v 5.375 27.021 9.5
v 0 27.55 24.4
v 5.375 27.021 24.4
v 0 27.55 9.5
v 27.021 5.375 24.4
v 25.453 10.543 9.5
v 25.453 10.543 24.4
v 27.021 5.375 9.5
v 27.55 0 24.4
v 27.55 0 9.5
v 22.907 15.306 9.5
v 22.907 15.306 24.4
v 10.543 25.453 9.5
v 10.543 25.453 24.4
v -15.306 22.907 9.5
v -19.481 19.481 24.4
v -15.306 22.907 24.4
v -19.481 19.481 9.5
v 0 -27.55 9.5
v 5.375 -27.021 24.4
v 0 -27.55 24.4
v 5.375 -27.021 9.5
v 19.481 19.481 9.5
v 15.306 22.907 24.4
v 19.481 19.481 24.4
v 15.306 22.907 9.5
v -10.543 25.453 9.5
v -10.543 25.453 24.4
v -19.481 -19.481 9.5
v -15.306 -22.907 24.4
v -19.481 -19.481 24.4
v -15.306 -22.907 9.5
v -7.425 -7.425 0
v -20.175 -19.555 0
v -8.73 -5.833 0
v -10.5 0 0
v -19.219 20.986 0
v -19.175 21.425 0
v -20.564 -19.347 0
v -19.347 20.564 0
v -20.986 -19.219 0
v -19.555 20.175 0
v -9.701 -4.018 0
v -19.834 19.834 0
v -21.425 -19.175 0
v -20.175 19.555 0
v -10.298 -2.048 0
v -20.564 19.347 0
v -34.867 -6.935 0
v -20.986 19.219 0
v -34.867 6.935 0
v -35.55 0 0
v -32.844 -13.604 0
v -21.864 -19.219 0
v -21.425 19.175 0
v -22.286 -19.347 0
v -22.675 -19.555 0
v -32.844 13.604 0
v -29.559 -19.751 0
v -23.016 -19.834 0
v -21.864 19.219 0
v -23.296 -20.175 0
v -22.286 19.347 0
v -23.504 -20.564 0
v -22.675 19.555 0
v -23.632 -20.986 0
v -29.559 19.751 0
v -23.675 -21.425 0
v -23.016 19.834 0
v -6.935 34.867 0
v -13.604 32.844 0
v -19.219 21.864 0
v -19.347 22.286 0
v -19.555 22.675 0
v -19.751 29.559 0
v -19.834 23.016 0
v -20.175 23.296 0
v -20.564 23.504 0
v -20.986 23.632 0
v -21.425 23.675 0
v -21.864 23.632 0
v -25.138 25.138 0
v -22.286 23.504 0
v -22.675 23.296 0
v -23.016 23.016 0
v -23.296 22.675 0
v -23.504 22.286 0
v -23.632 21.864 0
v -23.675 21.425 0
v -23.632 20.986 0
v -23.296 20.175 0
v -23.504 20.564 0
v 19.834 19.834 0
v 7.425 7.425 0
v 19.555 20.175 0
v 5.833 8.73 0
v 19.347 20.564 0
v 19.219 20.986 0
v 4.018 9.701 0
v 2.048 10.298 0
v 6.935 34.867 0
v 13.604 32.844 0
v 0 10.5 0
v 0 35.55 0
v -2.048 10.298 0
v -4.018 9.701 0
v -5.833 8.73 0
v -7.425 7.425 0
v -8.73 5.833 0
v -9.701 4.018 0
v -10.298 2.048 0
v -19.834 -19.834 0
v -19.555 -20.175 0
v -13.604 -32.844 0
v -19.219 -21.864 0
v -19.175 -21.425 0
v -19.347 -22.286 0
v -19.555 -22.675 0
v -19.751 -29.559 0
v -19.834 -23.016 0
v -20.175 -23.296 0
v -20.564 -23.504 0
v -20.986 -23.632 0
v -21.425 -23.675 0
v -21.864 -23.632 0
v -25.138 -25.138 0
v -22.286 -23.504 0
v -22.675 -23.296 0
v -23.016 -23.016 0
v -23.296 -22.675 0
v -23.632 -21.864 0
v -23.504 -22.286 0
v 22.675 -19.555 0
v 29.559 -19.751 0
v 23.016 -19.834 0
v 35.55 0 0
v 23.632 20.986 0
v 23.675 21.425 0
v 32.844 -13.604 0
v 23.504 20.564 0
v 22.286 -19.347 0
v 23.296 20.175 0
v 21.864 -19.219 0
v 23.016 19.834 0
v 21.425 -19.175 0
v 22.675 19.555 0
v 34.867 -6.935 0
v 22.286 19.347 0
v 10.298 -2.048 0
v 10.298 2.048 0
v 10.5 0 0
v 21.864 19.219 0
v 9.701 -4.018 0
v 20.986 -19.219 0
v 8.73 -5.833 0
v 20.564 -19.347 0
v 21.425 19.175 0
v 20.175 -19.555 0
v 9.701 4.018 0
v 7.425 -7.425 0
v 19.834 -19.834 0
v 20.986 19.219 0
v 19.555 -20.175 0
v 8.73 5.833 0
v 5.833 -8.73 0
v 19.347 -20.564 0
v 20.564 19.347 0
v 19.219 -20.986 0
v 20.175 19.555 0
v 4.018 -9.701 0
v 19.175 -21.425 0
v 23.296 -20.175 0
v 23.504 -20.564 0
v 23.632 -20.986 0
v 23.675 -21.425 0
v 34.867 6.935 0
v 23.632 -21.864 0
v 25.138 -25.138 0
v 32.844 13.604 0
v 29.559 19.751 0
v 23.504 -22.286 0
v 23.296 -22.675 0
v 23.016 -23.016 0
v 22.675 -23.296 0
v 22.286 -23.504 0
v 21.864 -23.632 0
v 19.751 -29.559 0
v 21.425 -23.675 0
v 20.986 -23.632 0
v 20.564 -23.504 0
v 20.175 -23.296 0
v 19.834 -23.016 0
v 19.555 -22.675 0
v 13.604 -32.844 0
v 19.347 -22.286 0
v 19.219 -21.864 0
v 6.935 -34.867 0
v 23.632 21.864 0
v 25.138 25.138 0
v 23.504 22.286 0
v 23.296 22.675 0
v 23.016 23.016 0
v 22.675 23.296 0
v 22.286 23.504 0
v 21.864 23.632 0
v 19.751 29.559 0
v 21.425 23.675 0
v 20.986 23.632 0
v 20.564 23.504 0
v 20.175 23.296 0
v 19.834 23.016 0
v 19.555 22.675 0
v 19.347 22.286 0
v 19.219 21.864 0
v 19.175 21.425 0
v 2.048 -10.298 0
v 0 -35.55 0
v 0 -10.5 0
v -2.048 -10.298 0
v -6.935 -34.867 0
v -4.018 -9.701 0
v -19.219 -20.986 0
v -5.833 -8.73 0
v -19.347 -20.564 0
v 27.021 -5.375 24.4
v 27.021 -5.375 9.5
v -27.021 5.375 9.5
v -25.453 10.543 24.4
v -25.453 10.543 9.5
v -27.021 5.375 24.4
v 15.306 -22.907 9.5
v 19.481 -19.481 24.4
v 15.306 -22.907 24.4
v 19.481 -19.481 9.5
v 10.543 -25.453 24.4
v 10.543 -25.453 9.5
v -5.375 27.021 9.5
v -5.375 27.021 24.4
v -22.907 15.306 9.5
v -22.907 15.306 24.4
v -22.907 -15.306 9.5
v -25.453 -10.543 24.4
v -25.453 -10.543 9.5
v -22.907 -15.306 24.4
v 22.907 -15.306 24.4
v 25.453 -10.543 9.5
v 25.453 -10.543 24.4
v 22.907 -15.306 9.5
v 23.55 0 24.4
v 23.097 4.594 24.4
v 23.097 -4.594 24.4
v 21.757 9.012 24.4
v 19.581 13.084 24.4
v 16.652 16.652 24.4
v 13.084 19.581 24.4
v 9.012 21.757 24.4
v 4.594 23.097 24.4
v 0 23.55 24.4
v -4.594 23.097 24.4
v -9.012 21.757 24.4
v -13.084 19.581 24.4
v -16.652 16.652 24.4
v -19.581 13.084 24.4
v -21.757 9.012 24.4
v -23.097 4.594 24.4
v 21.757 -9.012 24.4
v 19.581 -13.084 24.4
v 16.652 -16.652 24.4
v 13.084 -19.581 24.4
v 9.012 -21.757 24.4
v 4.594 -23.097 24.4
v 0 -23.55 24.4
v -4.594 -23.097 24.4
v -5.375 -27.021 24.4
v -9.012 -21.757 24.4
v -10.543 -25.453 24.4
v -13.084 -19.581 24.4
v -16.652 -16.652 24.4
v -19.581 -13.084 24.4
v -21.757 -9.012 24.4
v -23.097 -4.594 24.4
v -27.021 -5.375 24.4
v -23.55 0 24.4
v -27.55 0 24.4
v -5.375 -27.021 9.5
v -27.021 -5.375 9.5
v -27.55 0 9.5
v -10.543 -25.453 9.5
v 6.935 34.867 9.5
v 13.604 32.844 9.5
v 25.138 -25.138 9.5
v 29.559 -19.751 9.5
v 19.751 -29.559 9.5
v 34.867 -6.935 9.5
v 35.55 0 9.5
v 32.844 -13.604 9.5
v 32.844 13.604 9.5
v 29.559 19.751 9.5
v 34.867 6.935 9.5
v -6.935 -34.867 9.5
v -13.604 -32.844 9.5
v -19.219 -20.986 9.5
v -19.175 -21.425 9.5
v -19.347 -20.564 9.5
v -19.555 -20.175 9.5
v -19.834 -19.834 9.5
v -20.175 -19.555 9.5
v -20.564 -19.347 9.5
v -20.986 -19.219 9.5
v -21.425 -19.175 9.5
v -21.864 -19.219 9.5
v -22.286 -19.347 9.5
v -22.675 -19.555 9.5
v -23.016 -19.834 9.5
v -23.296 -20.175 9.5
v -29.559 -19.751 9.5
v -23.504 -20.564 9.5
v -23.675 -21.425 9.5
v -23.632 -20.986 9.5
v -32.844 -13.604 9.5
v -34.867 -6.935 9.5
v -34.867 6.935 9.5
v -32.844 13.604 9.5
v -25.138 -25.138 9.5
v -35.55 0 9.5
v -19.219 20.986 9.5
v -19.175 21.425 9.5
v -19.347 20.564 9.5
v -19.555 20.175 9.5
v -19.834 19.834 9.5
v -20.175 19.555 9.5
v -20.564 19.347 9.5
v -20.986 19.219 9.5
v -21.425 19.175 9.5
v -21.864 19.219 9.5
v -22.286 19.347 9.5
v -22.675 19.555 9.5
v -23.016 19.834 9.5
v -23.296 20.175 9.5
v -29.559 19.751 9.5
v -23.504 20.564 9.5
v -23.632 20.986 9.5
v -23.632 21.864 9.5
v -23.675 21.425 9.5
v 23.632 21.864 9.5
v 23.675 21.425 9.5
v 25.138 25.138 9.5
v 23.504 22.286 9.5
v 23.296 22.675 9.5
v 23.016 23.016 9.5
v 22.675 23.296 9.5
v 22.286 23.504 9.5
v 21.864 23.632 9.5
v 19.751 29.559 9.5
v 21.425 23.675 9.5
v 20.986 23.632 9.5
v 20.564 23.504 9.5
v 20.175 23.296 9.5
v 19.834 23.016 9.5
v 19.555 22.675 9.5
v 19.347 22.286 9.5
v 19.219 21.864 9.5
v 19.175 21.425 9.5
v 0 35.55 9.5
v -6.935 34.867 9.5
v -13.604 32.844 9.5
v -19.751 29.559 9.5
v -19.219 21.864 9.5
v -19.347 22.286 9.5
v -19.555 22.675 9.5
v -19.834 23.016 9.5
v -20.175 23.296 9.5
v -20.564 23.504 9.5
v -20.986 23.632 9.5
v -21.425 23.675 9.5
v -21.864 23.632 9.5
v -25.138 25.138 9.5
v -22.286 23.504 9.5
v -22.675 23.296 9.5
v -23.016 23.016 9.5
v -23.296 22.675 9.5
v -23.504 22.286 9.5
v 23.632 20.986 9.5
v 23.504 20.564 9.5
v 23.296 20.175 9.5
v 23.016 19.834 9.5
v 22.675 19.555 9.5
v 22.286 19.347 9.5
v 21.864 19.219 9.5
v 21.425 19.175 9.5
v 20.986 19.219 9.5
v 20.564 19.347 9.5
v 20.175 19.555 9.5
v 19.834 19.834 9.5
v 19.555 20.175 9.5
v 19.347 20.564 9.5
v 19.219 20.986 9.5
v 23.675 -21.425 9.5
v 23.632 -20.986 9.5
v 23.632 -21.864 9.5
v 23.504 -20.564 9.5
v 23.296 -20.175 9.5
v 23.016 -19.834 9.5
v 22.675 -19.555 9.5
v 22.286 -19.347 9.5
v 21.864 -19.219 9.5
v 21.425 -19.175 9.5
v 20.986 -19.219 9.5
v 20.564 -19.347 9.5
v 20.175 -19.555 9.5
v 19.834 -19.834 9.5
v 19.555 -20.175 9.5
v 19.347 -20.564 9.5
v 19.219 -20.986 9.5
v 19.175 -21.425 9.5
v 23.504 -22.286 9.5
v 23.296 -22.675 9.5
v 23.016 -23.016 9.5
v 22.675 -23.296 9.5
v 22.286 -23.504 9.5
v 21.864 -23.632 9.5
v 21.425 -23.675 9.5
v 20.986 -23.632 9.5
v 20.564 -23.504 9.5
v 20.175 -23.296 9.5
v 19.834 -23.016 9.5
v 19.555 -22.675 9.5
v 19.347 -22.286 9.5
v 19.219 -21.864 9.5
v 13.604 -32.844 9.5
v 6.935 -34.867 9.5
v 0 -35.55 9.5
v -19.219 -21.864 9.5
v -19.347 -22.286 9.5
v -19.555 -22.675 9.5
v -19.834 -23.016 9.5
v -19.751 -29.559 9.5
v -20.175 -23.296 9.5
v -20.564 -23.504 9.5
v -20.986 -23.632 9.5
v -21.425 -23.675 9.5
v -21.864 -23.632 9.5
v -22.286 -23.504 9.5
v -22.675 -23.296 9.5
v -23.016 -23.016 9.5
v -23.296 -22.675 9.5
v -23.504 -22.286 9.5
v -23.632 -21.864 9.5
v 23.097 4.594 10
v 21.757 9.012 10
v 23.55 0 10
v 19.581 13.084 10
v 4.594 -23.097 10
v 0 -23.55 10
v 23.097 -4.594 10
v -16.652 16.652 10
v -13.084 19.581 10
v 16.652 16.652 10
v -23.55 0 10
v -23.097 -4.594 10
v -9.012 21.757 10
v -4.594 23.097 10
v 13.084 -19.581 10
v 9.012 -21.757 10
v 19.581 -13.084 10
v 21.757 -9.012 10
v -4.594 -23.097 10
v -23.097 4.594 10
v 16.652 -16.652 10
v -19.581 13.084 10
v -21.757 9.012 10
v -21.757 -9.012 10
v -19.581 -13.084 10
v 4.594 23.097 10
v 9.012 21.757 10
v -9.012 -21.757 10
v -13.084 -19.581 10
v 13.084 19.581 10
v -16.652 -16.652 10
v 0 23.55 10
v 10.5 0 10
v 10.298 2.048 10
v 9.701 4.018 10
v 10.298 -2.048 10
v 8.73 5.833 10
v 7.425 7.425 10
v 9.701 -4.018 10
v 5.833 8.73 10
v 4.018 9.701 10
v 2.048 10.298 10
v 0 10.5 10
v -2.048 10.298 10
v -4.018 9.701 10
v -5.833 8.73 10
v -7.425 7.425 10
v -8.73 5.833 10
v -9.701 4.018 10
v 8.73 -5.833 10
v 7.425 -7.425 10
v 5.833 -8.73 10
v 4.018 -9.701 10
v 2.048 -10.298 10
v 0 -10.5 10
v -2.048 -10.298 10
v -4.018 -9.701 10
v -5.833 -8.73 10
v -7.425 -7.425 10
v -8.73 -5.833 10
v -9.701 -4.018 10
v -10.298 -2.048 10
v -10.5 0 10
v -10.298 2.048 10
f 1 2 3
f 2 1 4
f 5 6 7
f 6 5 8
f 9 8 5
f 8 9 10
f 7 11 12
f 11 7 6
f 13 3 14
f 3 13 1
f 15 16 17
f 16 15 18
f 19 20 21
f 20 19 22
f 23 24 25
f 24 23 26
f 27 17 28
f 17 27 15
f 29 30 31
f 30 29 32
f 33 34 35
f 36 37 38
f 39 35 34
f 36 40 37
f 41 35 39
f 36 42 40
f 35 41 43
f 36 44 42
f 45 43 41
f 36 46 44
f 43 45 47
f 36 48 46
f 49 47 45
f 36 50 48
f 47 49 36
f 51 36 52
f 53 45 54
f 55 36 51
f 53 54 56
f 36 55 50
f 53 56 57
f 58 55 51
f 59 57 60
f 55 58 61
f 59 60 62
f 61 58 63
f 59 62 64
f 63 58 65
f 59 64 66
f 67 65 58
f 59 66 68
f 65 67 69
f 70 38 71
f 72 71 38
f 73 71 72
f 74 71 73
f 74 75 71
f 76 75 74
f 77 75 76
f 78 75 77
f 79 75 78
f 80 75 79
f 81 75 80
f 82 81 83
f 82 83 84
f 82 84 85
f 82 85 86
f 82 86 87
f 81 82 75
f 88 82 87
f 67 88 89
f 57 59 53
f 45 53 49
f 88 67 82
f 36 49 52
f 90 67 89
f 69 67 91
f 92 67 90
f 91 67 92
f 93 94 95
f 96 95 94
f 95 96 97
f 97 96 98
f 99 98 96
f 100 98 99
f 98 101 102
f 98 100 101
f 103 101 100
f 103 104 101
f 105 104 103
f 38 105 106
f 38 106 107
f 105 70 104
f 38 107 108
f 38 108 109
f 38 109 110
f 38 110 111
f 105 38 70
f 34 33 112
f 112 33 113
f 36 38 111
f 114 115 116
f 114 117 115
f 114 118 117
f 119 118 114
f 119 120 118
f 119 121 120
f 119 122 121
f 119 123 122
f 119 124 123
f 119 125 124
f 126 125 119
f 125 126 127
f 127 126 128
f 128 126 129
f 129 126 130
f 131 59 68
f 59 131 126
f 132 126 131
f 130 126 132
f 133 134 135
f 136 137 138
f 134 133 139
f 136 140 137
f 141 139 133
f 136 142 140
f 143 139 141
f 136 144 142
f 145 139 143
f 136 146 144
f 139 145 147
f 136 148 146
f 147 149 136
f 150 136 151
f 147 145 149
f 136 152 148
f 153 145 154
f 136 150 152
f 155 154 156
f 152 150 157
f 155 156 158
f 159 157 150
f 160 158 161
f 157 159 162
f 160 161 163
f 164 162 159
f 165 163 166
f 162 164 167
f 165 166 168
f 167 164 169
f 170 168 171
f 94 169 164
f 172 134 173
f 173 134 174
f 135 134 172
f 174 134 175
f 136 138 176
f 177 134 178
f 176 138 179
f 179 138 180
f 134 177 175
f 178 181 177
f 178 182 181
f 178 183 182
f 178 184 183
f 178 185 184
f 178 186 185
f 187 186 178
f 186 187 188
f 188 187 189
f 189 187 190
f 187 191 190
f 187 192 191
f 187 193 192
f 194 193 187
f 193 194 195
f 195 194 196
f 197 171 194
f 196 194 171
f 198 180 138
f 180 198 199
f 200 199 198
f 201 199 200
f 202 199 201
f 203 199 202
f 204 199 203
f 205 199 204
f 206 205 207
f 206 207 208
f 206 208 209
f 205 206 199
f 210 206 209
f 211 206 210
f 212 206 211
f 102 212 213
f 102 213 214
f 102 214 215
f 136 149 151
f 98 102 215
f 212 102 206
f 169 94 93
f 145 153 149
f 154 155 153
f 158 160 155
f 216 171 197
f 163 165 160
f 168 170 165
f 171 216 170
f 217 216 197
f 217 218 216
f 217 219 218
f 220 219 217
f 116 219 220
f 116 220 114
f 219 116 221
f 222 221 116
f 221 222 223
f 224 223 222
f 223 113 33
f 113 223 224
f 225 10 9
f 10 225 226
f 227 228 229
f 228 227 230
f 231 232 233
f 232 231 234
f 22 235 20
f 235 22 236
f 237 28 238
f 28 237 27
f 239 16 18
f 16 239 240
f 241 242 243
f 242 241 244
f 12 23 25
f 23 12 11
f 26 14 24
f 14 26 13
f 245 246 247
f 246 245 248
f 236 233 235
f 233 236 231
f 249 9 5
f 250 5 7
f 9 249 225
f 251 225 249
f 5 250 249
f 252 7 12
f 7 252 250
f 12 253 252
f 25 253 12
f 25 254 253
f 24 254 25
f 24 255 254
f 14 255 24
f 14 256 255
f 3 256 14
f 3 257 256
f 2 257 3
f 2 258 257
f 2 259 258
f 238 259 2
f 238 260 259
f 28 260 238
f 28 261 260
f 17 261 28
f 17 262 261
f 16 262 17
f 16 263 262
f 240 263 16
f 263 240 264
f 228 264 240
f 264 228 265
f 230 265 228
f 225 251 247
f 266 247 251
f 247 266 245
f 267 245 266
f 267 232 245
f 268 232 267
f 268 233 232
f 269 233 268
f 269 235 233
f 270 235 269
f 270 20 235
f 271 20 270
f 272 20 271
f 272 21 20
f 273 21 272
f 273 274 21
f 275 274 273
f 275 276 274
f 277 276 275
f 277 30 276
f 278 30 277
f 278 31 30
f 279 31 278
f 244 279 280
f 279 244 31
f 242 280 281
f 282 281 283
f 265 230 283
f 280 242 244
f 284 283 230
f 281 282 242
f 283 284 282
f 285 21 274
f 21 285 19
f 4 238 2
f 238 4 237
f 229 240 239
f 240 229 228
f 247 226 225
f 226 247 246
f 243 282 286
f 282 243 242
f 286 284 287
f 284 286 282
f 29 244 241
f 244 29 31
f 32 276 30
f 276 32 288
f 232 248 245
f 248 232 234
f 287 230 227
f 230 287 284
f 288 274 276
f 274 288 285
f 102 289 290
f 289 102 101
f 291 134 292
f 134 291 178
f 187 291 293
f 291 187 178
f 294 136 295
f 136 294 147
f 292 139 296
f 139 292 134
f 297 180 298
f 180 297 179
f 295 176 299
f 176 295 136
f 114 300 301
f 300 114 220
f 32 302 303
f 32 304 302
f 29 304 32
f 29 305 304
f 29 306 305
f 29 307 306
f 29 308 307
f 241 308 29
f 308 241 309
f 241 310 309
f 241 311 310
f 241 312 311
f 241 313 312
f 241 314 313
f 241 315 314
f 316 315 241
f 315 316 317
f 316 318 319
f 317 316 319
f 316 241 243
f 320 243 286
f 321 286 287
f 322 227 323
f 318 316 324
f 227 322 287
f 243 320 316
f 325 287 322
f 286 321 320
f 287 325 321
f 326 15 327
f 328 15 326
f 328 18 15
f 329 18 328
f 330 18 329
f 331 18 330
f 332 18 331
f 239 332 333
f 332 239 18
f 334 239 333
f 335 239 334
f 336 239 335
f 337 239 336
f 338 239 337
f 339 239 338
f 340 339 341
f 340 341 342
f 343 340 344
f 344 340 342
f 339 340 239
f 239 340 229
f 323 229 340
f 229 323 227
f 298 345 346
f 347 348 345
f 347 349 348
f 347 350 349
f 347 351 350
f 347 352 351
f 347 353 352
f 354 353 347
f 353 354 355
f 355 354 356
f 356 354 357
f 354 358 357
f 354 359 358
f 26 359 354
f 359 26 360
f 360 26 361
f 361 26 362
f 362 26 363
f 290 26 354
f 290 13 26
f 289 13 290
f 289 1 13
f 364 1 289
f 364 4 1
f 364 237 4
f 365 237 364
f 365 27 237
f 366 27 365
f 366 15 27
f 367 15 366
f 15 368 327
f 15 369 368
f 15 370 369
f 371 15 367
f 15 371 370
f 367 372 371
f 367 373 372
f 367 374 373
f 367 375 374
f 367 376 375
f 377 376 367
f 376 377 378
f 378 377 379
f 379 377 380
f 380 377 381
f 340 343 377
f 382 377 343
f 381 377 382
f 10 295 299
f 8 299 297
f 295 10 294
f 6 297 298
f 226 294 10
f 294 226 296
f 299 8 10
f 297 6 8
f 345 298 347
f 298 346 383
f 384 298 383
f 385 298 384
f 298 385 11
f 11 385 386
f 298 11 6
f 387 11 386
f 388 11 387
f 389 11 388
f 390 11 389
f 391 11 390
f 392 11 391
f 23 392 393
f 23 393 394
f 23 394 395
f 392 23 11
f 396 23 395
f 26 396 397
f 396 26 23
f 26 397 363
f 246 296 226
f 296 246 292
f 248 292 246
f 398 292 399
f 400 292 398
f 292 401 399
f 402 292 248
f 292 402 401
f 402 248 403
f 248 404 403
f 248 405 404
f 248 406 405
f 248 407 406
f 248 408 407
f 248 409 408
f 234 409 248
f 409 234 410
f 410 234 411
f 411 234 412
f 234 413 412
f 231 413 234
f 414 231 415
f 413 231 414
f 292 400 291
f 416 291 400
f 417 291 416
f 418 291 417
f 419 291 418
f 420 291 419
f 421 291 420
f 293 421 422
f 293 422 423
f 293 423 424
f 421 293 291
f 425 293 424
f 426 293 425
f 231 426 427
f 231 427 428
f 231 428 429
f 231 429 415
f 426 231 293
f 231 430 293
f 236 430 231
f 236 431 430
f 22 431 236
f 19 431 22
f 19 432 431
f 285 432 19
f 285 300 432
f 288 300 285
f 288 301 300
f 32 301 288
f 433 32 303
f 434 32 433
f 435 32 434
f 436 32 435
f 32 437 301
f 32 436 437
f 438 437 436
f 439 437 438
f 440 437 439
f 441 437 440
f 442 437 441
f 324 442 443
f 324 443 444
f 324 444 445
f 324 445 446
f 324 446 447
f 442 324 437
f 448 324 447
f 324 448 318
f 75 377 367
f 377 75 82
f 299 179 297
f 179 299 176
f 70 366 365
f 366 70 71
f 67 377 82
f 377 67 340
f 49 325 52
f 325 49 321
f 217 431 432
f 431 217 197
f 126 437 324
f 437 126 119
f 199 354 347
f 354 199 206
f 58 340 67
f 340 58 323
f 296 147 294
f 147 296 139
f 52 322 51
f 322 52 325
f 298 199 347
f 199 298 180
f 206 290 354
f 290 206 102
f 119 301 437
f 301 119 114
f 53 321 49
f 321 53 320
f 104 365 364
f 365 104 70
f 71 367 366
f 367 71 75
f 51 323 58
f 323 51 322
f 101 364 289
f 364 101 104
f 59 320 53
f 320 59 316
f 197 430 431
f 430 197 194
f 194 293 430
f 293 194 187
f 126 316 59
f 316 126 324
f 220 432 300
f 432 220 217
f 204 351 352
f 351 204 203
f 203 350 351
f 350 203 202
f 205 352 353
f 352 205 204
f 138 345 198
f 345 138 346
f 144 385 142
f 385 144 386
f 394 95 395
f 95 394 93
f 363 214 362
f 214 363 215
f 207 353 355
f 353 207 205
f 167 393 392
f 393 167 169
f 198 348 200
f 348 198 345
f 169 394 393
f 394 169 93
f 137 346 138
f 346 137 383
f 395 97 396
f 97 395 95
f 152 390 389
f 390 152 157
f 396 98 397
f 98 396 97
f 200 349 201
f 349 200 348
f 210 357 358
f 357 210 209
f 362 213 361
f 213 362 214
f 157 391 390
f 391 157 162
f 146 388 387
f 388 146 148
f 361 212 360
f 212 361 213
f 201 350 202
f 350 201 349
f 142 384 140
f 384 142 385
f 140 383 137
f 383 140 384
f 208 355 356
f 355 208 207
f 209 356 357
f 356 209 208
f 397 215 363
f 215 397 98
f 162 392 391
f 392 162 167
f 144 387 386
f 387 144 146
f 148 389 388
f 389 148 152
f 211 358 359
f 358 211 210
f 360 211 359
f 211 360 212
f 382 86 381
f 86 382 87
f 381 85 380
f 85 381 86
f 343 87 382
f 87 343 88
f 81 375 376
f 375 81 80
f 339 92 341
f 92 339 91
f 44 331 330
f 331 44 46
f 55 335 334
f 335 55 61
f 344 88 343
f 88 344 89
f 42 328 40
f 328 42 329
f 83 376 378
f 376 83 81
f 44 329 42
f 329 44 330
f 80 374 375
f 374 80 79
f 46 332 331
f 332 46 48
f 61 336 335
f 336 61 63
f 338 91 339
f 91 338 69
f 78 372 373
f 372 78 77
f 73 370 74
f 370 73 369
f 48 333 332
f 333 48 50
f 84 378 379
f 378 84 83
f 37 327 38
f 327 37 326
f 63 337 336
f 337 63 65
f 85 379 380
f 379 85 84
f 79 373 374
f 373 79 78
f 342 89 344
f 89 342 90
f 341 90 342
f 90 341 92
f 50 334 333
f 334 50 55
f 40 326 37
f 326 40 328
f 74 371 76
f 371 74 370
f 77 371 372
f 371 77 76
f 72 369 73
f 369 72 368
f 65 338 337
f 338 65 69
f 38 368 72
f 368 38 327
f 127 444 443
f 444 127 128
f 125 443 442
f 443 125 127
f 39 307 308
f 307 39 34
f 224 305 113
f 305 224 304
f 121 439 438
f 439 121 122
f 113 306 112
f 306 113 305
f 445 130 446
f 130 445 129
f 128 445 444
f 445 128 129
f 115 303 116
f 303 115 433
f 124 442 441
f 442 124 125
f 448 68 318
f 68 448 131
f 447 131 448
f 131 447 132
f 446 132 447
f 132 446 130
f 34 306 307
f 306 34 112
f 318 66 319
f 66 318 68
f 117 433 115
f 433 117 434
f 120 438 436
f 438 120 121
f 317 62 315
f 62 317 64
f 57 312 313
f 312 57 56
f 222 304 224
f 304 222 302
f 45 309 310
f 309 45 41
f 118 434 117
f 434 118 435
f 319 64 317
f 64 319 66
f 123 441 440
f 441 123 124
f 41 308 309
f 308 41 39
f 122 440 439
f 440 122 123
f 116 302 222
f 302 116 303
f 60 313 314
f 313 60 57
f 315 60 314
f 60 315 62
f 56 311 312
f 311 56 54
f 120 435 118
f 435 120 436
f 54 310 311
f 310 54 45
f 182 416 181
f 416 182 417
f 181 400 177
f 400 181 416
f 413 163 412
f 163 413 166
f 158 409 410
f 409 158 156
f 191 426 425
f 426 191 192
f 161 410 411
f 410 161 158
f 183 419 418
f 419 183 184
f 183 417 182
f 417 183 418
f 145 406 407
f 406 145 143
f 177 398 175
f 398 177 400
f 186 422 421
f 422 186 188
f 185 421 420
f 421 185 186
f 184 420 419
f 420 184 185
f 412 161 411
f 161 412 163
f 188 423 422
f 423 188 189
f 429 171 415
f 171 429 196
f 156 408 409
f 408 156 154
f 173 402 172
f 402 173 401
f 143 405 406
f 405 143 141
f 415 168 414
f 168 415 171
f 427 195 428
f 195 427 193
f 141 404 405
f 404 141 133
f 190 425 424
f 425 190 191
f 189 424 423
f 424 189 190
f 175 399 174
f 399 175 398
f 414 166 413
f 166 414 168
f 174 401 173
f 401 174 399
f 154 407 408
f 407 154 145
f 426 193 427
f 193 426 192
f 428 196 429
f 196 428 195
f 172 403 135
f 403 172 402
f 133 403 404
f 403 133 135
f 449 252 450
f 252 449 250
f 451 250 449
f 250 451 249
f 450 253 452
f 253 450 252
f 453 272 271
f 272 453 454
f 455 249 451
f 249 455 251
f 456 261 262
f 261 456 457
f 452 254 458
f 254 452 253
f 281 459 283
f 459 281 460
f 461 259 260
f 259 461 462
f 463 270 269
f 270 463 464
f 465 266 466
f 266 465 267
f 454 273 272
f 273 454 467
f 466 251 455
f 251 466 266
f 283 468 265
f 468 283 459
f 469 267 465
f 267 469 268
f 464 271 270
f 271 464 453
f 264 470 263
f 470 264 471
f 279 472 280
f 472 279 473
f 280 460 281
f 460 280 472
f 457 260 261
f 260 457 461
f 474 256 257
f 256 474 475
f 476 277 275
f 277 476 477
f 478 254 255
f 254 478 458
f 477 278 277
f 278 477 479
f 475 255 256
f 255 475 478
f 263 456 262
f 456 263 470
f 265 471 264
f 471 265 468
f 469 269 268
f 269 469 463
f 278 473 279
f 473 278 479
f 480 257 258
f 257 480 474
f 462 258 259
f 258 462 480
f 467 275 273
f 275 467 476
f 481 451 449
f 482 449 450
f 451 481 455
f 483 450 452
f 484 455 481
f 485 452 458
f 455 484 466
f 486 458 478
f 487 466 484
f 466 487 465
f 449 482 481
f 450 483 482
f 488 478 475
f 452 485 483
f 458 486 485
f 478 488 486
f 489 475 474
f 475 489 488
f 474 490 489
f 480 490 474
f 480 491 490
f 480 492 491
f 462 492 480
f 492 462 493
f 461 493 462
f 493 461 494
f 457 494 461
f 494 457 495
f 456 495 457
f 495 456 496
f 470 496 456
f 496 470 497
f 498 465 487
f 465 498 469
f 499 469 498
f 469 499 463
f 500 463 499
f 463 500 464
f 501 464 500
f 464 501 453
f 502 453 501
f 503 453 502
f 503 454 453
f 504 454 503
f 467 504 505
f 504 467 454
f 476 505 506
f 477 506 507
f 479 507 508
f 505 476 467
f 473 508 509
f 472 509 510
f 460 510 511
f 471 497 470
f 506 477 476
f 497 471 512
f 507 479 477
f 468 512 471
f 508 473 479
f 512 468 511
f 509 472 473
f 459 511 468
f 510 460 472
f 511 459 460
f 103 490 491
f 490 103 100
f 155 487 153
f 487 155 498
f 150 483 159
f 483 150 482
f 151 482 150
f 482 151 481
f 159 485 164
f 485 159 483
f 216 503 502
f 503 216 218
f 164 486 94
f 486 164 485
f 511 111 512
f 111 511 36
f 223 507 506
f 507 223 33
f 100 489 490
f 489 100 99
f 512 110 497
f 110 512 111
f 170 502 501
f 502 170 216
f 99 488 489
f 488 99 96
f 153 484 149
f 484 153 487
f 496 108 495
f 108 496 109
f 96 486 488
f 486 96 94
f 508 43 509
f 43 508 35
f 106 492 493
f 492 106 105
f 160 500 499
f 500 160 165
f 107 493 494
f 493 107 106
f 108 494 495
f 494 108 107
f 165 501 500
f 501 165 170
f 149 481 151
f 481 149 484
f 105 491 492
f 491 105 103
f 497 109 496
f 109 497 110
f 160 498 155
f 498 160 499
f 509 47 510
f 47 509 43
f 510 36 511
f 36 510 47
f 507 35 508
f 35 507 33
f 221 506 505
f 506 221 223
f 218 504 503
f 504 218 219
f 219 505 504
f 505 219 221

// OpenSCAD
$fn = 32;

// ----------------------------------------------------------------------
// Bearing housing: seat for 6204 (47 x 14 mm), 55.1 mm body
// ----------------------------------------------------------------------

// --- parameters (mm) ---
housing_d = 55.1;         // housing outside diameter
housing_h = 24.4;         // overall housing height
wall_t = 4;               // wall thickness
seat_d = 47.1;            // 6204 seat, 0.1 mm clearance
seat_h = 14.4;            // pocket depth
shoulder = 2;             // shoulder under the bearing
pass_d = 21;              // shaft passage
flange_d = 71.1;          // mounting flange diameter
flange_t = 8;             // flange thickness
bolt_d = 4.5;             // flange bolt clearance
bolt_r = 30.3;            // flange bolt circle radius

module body() {
  cylinder(h = housing_h, d = housing_d);
}

module flange() {
  /* flange sunk 1.5 mm into the body */
  cylinder(h = flange_t + 1.5, d = flange_d);
}

difference() {
  union() {
    body();
    flange();
  }
  translate([0, 0, housing_h - seat_h]) cylinder(h = seat_h + 1, d = seat_d);
  translate([0, 0, -1]) cylinder(h = housing_h - seat_h + 1, d = pass_d);
  for (i = [0 : 3]) rotate([0, 0, 45 + i * 90]) translate([bolt_r, 0, -1])
    cylinder(h = flange_t + 3, d = bolt_d);
}
